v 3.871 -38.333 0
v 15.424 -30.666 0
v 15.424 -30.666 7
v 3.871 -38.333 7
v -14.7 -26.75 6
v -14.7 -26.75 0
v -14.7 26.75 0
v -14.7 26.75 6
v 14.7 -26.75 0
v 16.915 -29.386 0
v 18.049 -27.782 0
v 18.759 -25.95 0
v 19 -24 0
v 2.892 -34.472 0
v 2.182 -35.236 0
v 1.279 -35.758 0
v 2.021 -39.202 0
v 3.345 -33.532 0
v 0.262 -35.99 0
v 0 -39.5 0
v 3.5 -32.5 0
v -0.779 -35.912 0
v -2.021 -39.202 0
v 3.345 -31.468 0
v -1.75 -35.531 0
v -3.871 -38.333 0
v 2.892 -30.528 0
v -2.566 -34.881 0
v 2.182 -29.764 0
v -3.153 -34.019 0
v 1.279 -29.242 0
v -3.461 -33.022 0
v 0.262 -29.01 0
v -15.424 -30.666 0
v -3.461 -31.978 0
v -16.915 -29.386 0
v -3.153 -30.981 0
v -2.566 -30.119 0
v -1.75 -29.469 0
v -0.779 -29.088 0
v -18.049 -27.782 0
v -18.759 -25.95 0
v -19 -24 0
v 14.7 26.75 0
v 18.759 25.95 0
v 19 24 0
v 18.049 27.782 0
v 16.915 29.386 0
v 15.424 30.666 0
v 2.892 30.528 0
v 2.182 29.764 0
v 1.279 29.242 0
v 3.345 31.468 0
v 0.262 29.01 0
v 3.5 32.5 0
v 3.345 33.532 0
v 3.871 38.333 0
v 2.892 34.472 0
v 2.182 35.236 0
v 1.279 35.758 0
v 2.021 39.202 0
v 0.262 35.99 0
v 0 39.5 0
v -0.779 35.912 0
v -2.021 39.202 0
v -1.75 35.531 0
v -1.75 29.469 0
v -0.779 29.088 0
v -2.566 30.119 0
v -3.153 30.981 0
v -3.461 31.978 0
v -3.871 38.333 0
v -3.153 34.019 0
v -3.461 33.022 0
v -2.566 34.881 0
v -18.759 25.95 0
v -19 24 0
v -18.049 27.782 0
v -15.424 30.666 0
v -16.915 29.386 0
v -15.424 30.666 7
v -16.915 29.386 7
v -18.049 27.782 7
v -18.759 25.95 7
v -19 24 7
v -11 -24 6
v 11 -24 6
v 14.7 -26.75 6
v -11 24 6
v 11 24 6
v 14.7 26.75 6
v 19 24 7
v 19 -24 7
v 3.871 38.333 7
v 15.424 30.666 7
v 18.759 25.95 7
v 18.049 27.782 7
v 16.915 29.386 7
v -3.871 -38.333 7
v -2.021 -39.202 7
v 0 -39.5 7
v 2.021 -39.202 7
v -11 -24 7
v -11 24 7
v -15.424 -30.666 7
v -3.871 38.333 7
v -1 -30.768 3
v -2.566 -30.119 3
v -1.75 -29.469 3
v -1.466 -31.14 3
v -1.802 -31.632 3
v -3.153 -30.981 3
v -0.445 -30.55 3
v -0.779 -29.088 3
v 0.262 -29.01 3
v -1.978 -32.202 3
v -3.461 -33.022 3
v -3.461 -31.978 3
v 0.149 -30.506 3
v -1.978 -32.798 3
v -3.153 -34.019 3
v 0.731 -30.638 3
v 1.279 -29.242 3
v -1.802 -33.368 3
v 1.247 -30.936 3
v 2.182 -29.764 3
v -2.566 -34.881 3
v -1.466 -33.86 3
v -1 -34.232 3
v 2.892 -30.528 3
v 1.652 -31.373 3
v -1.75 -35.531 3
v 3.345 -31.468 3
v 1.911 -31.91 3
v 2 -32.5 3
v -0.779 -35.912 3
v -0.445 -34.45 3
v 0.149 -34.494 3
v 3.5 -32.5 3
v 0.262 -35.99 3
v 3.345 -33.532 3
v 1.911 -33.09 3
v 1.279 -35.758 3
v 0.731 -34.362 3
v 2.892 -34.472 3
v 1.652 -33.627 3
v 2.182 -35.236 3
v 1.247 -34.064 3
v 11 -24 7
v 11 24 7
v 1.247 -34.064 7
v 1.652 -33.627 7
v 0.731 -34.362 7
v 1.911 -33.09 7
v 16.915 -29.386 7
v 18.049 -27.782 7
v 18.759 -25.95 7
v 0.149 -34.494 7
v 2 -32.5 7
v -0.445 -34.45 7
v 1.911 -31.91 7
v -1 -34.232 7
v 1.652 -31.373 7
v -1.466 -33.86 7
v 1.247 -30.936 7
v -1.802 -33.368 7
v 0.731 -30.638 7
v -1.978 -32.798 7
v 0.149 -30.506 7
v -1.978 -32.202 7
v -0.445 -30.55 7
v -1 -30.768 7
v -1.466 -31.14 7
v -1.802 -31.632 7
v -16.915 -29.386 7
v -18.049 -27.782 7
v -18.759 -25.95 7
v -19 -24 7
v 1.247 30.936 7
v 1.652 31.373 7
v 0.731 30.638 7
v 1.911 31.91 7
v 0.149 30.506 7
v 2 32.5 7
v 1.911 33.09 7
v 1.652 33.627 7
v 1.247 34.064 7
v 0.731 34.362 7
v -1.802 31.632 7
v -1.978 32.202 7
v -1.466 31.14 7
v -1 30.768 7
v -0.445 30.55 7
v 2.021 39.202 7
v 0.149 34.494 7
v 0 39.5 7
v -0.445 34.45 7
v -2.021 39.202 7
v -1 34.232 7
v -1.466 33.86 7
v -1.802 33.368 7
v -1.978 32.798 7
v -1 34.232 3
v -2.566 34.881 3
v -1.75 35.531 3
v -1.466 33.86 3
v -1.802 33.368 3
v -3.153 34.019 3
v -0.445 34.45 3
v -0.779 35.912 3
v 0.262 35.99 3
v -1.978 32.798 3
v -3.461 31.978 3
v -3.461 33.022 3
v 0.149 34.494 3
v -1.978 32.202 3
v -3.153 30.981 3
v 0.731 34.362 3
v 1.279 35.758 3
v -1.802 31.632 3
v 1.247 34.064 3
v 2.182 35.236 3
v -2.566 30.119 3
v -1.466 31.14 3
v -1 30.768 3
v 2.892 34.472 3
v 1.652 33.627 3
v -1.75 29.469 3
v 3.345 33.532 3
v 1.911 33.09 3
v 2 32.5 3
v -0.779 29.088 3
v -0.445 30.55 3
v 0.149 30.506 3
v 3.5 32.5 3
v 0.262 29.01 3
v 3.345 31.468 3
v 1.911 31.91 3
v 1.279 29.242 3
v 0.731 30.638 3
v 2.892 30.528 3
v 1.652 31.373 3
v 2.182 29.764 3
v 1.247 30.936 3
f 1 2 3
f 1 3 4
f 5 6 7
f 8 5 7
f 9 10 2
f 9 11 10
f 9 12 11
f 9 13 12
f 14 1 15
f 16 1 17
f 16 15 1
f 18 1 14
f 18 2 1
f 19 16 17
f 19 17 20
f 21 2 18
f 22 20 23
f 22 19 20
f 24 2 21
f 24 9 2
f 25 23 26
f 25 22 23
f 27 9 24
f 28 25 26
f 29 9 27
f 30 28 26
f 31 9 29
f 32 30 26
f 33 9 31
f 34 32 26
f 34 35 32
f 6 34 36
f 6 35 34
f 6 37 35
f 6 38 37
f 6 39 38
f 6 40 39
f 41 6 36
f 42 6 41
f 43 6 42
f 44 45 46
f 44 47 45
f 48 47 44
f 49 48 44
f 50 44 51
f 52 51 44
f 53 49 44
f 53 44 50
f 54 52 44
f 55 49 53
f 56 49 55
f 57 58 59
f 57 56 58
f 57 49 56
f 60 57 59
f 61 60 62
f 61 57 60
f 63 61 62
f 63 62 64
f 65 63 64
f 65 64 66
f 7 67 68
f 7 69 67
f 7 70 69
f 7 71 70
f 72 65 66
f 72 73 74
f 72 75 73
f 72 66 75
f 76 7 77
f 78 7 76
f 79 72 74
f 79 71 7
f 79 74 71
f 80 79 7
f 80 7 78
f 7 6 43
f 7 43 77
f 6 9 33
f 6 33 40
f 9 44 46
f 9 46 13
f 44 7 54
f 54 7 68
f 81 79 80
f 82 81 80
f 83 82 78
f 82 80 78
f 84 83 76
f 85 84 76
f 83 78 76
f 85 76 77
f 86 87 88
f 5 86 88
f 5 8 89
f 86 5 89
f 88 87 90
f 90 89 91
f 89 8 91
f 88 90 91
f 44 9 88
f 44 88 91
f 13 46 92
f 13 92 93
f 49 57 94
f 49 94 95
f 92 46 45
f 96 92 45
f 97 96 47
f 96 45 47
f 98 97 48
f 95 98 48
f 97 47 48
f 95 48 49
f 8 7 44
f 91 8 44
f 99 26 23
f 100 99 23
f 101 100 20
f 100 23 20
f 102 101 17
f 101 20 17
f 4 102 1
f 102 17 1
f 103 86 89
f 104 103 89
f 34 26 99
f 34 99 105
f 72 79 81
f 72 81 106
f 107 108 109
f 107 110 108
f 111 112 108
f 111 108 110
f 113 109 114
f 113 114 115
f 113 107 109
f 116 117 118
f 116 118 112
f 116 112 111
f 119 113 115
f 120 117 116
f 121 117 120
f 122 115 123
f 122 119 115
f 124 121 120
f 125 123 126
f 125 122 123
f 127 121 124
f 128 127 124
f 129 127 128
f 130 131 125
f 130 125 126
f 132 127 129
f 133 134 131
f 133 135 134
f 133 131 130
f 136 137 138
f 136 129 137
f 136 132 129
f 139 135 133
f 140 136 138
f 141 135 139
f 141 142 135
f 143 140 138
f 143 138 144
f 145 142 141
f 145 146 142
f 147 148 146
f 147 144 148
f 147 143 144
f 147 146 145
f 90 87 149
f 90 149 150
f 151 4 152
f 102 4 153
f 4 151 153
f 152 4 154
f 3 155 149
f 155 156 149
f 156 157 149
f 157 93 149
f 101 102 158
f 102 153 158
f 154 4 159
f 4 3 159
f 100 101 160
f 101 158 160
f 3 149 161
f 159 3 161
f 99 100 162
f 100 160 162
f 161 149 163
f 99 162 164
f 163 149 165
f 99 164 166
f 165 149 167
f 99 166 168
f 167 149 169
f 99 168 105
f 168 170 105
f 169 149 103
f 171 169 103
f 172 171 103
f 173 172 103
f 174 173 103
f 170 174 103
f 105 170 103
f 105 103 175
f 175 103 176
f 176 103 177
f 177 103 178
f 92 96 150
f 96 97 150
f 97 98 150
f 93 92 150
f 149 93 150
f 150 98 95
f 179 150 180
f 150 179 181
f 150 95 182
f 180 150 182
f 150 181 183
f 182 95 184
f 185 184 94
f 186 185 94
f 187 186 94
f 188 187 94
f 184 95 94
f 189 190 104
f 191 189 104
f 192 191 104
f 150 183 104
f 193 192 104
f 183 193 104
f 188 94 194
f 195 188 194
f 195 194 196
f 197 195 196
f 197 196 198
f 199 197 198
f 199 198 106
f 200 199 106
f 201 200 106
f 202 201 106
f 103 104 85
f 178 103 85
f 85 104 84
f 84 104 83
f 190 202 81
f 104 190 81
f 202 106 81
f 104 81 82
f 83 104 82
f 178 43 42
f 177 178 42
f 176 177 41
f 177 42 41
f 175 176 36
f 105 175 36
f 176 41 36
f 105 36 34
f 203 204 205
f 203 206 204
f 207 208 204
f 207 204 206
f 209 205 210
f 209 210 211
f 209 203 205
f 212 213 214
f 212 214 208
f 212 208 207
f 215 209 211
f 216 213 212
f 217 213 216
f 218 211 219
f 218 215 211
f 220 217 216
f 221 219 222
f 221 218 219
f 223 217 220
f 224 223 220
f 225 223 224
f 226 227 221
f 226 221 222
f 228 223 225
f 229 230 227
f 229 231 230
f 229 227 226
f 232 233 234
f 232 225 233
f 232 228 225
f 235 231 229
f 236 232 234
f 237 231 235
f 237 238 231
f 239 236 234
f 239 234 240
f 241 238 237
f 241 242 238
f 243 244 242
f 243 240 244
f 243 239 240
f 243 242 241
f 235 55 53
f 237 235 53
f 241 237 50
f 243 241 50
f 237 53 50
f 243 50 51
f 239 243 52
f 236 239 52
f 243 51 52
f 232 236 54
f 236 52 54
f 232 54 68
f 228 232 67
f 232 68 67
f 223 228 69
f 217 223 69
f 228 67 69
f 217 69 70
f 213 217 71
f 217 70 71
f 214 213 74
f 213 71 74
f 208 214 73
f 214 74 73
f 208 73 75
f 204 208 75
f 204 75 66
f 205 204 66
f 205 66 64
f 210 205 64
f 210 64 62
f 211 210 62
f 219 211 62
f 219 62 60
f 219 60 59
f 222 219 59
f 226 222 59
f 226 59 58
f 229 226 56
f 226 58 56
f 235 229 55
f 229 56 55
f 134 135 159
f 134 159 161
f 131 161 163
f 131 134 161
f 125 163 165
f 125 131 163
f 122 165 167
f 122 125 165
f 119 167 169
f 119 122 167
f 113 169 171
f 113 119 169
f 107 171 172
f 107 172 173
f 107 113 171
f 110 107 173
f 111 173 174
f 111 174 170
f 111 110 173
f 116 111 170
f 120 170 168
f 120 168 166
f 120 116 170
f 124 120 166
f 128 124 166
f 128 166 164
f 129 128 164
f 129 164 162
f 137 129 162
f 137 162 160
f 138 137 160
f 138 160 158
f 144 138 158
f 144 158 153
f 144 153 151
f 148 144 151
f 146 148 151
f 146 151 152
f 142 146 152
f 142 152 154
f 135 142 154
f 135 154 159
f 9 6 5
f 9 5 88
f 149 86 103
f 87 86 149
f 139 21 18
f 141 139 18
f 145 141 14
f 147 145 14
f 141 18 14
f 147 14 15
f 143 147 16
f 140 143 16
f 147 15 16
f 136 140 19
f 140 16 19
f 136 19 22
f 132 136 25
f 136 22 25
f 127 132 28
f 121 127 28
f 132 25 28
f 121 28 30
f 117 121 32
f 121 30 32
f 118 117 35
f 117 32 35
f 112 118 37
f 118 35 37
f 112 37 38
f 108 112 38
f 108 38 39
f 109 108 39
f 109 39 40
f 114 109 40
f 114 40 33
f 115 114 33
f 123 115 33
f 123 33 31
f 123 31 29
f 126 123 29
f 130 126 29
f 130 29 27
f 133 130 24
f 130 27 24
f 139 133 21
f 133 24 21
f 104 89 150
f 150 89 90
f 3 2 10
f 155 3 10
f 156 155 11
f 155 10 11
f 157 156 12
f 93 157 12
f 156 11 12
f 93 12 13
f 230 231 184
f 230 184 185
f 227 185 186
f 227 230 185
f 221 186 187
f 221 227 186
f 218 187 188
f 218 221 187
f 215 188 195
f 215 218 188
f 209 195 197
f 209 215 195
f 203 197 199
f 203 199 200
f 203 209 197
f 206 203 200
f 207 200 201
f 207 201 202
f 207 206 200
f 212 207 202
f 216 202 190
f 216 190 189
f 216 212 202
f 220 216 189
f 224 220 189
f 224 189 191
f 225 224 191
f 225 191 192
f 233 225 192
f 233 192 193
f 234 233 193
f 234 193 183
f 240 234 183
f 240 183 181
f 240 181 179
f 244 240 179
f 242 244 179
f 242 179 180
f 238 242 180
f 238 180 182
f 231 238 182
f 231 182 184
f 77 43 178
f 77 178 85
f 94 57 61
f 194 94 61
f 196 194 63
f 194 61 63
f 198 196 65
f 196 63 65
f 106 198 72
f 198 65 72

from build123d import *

# Parameters (mm, degrees)
SKETCH_R        = 2
SKETCH_W        = 22
SKETCH_H        = 48
PAD_DEPTH       = 7
SKETCH001_W     = 29.4
SKETCH001_H     = 53.5
POCKET_DEPTH    = 6
SKETCH002_R     = 3.5
POCKET001_DEPTH = 3


with BuildPart() as part:
    # Sketch → Pad (new body)
    with BuildSketch(Plane.XY):
        with BuildLine():
            Line((3.870596, 38.332537), (15.423539, 30.665756))
            ThreePointArc((19, 24), (18.049408, 27.782307), (15.423539, 30.665756))
            Line((19, 24), (19, -24))
            ThreePointArc((15.423539, -30.665756), (18.049408, -27.782307), (19, -24))
            Line((15.423539, -30.665756), (3.870596, -38.332537))
            ThreePointArc((-3.870596, -38.332537), (0, -39.5), (3.870596, -38.332537))
            Line((-3.870596, -38.332537), (-15.423539, -30.665756))
            ThreePointArc((-19, -24), (-18.049408, -27.782307), (-15.423539, -30.665756))
            Line((-19, -24), (-19, 24))
            ThreePointArc((-15.423539, 30.665756), (-18.049408, 27.782307), (-19, 24))
            Line((-15.423539, 30.665756), (-3.870596, 38.332537))
            ThreePointArc((3.870596, 38.332537), (0, 39.5), (-3.870596, 38.332537))
        make_face()
        with Locations((0, 32.5)):
            Circle(SKETCH_R, mode=Mode.SUBTRACT)
        with Locations((0, -32.5)):
            Circle(SKETCH_R, mode=Mode.SUBTRACT)
        Rectangle(SKETCH_W, SKETCH_H, mode=Mode.SUBTRACT)
    extrude(amount=PAD_DEPTH)

    # Sketch001 → Pocket (cut)
    with BuildSketch(Plane.XY):
        Rectangle(SKETCH001_W, SKETCH001_H)
    extrude(amount=POCKET_DEPTH, mode=Mode.SUBTRACT)

    # Sketch002 (on Face4 of Pocket) → Pocket001 (cut)
    with BuildSketch(Plane(origin=(0, 0, 0), x_dir=(1, 0, 0), z_dir=(0, 0, -1))):
        with Locations((0, -32.5)):
            Circle(SKETCH002_R)
        with Locations((0, 32.5)):
            Circle(SKETCH002_R)
    extrude(amount=-POCKET001_DEPTH, mode=Mode.SUBTRACT)


solid = part.part
